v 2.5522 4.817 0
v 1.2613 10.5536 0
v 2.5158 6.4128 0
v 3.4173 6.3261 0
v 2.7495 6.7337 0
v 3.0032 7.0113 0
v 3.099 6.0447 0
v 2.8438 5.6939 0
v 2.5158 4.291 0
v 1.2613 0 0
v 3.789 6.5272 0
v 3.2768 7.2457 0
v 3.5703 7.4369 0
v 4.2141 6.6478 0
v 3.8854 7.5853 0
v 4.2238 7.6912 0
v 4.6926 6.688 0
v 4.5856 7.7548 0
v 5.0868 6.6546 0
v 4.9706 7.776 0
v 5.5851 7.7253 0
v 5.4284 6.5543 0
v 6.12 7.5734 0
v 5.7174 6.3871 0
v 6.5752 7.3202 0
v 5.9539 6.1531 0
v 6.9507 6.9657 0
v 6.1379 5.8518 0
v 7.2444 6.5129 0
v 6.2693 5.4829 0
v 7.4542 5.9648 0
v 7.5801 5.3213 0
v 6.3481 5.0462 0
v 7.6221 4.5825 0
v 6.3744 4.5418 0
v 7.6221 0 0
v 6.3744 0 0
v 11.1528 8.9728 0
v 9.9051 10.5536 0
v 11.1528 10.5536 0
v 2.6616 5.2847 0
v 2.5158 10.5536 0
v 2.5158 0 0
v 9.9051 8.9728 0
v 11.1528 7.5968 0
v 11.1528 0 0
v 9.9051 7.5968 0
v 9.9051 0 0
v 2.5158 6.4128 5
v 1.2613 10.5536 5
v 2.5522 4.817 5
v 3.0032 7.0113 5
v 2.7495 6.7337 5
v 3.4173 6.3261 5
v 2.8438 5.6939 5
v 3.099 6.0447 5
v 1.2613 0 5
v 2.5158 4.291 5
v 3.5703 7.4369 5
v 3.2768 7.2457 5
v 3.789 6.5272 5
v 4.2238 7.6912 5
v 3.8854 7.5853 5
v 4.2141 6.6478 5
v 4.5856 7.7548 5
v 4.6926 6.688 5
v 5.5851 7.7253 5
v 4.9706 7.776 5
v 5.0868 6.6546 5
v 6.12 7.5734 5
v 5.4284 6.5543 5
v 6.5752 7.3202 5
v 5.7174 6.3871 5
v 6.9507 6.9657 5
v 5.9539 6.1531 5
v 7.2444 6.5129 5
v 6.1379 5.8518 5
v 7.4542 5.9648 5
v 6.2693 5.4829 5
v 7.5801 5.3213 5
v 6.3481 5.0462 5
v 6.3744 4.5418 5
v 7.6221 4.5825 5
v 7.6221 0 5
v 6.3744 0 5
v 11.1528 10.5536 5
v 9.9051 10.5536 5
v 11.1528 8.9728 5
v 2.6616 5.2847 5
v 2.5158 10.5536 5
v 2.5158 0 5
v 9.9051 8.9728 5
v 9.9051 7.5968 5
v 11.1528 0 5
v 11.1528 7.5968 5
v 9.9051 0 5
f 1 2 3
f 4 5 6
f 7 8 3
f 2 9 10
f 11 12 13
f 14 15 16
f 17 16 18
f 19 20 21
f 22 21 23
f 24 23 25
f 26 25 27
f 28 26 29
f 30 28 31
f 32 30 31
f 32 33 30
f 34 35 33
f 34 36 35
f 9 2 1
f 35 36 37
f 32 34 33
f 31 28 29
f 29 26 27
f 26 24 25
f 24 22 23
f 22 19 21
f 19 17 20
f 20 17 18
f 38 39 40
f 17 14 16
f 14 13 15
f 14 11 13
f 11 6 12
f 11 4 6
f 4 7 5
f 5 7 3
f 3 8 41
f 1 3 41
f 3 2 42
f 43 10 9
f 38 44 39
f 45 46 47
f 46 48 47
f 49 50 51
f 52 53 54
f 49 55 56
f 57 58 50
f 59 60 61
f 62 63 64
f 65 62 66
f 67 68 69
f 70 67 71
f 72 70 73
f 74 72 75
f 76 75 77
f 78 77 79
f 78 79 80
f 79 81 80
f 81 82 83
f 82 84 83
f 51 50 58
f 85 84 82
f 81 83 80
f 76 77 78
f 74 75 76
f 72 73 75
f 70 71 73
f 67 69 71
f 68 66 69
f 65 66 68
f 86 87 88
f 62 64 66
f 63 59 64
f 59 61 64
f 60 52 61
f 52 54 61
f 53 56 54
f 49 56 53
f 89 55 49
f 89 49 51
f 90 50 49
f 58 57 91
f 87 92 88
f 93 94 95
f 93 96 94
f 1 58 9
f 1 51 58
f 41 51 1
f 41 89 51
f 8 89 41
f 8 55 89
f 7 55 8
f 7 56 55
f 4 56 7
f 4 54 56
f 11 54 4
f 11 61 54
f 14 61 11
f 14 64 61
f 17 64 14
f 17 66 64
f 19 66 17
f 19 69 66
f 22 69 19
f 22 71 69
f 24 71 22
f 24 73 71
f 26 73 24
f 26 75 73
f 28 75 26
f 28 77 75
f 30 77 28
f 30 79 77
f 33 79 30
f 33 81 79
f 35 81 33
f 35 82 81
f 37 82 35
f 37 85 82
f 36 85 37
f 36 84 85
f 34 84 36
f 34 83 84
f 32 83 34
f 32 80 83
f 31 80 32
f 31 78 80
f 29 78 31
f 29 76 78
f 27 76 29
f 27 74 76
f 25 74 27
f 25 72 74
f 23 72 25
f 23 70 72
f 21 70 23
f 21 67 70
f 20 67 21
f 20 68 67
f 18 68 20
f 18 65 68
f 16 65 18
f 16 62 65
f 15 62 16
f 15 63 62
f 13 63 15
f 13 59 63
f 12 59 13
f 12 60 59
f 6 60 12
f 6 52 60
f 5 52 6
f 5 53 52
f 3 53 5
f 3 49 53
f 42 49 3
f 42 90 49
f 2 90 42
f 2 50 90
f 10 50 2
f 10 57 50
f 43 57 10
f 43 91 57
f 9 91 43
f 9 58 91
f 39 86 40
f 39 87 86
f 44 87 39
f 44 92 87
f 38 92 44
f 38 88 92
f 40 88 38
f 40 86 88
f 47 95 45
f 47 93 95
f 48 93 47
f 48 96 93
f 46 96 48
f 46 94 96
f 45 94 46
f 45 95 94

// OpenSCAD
// text(): glyph outlines from the bundled Fira Sans (OFL 1.1) as a 2D
// profile, lifted by linear_extrude into a solid.
// The font is PINNED to the bundled family: OpenSCAD's fontconfig default
// (Liberation Sans) differs from the bundled OFL family, so the oracle
// comparison requires the bundled font installed for fontconfig (CI skips it
// when openscad is absent).
linear_extrude(height = 5) text("hi", font = "Fira Sans");
